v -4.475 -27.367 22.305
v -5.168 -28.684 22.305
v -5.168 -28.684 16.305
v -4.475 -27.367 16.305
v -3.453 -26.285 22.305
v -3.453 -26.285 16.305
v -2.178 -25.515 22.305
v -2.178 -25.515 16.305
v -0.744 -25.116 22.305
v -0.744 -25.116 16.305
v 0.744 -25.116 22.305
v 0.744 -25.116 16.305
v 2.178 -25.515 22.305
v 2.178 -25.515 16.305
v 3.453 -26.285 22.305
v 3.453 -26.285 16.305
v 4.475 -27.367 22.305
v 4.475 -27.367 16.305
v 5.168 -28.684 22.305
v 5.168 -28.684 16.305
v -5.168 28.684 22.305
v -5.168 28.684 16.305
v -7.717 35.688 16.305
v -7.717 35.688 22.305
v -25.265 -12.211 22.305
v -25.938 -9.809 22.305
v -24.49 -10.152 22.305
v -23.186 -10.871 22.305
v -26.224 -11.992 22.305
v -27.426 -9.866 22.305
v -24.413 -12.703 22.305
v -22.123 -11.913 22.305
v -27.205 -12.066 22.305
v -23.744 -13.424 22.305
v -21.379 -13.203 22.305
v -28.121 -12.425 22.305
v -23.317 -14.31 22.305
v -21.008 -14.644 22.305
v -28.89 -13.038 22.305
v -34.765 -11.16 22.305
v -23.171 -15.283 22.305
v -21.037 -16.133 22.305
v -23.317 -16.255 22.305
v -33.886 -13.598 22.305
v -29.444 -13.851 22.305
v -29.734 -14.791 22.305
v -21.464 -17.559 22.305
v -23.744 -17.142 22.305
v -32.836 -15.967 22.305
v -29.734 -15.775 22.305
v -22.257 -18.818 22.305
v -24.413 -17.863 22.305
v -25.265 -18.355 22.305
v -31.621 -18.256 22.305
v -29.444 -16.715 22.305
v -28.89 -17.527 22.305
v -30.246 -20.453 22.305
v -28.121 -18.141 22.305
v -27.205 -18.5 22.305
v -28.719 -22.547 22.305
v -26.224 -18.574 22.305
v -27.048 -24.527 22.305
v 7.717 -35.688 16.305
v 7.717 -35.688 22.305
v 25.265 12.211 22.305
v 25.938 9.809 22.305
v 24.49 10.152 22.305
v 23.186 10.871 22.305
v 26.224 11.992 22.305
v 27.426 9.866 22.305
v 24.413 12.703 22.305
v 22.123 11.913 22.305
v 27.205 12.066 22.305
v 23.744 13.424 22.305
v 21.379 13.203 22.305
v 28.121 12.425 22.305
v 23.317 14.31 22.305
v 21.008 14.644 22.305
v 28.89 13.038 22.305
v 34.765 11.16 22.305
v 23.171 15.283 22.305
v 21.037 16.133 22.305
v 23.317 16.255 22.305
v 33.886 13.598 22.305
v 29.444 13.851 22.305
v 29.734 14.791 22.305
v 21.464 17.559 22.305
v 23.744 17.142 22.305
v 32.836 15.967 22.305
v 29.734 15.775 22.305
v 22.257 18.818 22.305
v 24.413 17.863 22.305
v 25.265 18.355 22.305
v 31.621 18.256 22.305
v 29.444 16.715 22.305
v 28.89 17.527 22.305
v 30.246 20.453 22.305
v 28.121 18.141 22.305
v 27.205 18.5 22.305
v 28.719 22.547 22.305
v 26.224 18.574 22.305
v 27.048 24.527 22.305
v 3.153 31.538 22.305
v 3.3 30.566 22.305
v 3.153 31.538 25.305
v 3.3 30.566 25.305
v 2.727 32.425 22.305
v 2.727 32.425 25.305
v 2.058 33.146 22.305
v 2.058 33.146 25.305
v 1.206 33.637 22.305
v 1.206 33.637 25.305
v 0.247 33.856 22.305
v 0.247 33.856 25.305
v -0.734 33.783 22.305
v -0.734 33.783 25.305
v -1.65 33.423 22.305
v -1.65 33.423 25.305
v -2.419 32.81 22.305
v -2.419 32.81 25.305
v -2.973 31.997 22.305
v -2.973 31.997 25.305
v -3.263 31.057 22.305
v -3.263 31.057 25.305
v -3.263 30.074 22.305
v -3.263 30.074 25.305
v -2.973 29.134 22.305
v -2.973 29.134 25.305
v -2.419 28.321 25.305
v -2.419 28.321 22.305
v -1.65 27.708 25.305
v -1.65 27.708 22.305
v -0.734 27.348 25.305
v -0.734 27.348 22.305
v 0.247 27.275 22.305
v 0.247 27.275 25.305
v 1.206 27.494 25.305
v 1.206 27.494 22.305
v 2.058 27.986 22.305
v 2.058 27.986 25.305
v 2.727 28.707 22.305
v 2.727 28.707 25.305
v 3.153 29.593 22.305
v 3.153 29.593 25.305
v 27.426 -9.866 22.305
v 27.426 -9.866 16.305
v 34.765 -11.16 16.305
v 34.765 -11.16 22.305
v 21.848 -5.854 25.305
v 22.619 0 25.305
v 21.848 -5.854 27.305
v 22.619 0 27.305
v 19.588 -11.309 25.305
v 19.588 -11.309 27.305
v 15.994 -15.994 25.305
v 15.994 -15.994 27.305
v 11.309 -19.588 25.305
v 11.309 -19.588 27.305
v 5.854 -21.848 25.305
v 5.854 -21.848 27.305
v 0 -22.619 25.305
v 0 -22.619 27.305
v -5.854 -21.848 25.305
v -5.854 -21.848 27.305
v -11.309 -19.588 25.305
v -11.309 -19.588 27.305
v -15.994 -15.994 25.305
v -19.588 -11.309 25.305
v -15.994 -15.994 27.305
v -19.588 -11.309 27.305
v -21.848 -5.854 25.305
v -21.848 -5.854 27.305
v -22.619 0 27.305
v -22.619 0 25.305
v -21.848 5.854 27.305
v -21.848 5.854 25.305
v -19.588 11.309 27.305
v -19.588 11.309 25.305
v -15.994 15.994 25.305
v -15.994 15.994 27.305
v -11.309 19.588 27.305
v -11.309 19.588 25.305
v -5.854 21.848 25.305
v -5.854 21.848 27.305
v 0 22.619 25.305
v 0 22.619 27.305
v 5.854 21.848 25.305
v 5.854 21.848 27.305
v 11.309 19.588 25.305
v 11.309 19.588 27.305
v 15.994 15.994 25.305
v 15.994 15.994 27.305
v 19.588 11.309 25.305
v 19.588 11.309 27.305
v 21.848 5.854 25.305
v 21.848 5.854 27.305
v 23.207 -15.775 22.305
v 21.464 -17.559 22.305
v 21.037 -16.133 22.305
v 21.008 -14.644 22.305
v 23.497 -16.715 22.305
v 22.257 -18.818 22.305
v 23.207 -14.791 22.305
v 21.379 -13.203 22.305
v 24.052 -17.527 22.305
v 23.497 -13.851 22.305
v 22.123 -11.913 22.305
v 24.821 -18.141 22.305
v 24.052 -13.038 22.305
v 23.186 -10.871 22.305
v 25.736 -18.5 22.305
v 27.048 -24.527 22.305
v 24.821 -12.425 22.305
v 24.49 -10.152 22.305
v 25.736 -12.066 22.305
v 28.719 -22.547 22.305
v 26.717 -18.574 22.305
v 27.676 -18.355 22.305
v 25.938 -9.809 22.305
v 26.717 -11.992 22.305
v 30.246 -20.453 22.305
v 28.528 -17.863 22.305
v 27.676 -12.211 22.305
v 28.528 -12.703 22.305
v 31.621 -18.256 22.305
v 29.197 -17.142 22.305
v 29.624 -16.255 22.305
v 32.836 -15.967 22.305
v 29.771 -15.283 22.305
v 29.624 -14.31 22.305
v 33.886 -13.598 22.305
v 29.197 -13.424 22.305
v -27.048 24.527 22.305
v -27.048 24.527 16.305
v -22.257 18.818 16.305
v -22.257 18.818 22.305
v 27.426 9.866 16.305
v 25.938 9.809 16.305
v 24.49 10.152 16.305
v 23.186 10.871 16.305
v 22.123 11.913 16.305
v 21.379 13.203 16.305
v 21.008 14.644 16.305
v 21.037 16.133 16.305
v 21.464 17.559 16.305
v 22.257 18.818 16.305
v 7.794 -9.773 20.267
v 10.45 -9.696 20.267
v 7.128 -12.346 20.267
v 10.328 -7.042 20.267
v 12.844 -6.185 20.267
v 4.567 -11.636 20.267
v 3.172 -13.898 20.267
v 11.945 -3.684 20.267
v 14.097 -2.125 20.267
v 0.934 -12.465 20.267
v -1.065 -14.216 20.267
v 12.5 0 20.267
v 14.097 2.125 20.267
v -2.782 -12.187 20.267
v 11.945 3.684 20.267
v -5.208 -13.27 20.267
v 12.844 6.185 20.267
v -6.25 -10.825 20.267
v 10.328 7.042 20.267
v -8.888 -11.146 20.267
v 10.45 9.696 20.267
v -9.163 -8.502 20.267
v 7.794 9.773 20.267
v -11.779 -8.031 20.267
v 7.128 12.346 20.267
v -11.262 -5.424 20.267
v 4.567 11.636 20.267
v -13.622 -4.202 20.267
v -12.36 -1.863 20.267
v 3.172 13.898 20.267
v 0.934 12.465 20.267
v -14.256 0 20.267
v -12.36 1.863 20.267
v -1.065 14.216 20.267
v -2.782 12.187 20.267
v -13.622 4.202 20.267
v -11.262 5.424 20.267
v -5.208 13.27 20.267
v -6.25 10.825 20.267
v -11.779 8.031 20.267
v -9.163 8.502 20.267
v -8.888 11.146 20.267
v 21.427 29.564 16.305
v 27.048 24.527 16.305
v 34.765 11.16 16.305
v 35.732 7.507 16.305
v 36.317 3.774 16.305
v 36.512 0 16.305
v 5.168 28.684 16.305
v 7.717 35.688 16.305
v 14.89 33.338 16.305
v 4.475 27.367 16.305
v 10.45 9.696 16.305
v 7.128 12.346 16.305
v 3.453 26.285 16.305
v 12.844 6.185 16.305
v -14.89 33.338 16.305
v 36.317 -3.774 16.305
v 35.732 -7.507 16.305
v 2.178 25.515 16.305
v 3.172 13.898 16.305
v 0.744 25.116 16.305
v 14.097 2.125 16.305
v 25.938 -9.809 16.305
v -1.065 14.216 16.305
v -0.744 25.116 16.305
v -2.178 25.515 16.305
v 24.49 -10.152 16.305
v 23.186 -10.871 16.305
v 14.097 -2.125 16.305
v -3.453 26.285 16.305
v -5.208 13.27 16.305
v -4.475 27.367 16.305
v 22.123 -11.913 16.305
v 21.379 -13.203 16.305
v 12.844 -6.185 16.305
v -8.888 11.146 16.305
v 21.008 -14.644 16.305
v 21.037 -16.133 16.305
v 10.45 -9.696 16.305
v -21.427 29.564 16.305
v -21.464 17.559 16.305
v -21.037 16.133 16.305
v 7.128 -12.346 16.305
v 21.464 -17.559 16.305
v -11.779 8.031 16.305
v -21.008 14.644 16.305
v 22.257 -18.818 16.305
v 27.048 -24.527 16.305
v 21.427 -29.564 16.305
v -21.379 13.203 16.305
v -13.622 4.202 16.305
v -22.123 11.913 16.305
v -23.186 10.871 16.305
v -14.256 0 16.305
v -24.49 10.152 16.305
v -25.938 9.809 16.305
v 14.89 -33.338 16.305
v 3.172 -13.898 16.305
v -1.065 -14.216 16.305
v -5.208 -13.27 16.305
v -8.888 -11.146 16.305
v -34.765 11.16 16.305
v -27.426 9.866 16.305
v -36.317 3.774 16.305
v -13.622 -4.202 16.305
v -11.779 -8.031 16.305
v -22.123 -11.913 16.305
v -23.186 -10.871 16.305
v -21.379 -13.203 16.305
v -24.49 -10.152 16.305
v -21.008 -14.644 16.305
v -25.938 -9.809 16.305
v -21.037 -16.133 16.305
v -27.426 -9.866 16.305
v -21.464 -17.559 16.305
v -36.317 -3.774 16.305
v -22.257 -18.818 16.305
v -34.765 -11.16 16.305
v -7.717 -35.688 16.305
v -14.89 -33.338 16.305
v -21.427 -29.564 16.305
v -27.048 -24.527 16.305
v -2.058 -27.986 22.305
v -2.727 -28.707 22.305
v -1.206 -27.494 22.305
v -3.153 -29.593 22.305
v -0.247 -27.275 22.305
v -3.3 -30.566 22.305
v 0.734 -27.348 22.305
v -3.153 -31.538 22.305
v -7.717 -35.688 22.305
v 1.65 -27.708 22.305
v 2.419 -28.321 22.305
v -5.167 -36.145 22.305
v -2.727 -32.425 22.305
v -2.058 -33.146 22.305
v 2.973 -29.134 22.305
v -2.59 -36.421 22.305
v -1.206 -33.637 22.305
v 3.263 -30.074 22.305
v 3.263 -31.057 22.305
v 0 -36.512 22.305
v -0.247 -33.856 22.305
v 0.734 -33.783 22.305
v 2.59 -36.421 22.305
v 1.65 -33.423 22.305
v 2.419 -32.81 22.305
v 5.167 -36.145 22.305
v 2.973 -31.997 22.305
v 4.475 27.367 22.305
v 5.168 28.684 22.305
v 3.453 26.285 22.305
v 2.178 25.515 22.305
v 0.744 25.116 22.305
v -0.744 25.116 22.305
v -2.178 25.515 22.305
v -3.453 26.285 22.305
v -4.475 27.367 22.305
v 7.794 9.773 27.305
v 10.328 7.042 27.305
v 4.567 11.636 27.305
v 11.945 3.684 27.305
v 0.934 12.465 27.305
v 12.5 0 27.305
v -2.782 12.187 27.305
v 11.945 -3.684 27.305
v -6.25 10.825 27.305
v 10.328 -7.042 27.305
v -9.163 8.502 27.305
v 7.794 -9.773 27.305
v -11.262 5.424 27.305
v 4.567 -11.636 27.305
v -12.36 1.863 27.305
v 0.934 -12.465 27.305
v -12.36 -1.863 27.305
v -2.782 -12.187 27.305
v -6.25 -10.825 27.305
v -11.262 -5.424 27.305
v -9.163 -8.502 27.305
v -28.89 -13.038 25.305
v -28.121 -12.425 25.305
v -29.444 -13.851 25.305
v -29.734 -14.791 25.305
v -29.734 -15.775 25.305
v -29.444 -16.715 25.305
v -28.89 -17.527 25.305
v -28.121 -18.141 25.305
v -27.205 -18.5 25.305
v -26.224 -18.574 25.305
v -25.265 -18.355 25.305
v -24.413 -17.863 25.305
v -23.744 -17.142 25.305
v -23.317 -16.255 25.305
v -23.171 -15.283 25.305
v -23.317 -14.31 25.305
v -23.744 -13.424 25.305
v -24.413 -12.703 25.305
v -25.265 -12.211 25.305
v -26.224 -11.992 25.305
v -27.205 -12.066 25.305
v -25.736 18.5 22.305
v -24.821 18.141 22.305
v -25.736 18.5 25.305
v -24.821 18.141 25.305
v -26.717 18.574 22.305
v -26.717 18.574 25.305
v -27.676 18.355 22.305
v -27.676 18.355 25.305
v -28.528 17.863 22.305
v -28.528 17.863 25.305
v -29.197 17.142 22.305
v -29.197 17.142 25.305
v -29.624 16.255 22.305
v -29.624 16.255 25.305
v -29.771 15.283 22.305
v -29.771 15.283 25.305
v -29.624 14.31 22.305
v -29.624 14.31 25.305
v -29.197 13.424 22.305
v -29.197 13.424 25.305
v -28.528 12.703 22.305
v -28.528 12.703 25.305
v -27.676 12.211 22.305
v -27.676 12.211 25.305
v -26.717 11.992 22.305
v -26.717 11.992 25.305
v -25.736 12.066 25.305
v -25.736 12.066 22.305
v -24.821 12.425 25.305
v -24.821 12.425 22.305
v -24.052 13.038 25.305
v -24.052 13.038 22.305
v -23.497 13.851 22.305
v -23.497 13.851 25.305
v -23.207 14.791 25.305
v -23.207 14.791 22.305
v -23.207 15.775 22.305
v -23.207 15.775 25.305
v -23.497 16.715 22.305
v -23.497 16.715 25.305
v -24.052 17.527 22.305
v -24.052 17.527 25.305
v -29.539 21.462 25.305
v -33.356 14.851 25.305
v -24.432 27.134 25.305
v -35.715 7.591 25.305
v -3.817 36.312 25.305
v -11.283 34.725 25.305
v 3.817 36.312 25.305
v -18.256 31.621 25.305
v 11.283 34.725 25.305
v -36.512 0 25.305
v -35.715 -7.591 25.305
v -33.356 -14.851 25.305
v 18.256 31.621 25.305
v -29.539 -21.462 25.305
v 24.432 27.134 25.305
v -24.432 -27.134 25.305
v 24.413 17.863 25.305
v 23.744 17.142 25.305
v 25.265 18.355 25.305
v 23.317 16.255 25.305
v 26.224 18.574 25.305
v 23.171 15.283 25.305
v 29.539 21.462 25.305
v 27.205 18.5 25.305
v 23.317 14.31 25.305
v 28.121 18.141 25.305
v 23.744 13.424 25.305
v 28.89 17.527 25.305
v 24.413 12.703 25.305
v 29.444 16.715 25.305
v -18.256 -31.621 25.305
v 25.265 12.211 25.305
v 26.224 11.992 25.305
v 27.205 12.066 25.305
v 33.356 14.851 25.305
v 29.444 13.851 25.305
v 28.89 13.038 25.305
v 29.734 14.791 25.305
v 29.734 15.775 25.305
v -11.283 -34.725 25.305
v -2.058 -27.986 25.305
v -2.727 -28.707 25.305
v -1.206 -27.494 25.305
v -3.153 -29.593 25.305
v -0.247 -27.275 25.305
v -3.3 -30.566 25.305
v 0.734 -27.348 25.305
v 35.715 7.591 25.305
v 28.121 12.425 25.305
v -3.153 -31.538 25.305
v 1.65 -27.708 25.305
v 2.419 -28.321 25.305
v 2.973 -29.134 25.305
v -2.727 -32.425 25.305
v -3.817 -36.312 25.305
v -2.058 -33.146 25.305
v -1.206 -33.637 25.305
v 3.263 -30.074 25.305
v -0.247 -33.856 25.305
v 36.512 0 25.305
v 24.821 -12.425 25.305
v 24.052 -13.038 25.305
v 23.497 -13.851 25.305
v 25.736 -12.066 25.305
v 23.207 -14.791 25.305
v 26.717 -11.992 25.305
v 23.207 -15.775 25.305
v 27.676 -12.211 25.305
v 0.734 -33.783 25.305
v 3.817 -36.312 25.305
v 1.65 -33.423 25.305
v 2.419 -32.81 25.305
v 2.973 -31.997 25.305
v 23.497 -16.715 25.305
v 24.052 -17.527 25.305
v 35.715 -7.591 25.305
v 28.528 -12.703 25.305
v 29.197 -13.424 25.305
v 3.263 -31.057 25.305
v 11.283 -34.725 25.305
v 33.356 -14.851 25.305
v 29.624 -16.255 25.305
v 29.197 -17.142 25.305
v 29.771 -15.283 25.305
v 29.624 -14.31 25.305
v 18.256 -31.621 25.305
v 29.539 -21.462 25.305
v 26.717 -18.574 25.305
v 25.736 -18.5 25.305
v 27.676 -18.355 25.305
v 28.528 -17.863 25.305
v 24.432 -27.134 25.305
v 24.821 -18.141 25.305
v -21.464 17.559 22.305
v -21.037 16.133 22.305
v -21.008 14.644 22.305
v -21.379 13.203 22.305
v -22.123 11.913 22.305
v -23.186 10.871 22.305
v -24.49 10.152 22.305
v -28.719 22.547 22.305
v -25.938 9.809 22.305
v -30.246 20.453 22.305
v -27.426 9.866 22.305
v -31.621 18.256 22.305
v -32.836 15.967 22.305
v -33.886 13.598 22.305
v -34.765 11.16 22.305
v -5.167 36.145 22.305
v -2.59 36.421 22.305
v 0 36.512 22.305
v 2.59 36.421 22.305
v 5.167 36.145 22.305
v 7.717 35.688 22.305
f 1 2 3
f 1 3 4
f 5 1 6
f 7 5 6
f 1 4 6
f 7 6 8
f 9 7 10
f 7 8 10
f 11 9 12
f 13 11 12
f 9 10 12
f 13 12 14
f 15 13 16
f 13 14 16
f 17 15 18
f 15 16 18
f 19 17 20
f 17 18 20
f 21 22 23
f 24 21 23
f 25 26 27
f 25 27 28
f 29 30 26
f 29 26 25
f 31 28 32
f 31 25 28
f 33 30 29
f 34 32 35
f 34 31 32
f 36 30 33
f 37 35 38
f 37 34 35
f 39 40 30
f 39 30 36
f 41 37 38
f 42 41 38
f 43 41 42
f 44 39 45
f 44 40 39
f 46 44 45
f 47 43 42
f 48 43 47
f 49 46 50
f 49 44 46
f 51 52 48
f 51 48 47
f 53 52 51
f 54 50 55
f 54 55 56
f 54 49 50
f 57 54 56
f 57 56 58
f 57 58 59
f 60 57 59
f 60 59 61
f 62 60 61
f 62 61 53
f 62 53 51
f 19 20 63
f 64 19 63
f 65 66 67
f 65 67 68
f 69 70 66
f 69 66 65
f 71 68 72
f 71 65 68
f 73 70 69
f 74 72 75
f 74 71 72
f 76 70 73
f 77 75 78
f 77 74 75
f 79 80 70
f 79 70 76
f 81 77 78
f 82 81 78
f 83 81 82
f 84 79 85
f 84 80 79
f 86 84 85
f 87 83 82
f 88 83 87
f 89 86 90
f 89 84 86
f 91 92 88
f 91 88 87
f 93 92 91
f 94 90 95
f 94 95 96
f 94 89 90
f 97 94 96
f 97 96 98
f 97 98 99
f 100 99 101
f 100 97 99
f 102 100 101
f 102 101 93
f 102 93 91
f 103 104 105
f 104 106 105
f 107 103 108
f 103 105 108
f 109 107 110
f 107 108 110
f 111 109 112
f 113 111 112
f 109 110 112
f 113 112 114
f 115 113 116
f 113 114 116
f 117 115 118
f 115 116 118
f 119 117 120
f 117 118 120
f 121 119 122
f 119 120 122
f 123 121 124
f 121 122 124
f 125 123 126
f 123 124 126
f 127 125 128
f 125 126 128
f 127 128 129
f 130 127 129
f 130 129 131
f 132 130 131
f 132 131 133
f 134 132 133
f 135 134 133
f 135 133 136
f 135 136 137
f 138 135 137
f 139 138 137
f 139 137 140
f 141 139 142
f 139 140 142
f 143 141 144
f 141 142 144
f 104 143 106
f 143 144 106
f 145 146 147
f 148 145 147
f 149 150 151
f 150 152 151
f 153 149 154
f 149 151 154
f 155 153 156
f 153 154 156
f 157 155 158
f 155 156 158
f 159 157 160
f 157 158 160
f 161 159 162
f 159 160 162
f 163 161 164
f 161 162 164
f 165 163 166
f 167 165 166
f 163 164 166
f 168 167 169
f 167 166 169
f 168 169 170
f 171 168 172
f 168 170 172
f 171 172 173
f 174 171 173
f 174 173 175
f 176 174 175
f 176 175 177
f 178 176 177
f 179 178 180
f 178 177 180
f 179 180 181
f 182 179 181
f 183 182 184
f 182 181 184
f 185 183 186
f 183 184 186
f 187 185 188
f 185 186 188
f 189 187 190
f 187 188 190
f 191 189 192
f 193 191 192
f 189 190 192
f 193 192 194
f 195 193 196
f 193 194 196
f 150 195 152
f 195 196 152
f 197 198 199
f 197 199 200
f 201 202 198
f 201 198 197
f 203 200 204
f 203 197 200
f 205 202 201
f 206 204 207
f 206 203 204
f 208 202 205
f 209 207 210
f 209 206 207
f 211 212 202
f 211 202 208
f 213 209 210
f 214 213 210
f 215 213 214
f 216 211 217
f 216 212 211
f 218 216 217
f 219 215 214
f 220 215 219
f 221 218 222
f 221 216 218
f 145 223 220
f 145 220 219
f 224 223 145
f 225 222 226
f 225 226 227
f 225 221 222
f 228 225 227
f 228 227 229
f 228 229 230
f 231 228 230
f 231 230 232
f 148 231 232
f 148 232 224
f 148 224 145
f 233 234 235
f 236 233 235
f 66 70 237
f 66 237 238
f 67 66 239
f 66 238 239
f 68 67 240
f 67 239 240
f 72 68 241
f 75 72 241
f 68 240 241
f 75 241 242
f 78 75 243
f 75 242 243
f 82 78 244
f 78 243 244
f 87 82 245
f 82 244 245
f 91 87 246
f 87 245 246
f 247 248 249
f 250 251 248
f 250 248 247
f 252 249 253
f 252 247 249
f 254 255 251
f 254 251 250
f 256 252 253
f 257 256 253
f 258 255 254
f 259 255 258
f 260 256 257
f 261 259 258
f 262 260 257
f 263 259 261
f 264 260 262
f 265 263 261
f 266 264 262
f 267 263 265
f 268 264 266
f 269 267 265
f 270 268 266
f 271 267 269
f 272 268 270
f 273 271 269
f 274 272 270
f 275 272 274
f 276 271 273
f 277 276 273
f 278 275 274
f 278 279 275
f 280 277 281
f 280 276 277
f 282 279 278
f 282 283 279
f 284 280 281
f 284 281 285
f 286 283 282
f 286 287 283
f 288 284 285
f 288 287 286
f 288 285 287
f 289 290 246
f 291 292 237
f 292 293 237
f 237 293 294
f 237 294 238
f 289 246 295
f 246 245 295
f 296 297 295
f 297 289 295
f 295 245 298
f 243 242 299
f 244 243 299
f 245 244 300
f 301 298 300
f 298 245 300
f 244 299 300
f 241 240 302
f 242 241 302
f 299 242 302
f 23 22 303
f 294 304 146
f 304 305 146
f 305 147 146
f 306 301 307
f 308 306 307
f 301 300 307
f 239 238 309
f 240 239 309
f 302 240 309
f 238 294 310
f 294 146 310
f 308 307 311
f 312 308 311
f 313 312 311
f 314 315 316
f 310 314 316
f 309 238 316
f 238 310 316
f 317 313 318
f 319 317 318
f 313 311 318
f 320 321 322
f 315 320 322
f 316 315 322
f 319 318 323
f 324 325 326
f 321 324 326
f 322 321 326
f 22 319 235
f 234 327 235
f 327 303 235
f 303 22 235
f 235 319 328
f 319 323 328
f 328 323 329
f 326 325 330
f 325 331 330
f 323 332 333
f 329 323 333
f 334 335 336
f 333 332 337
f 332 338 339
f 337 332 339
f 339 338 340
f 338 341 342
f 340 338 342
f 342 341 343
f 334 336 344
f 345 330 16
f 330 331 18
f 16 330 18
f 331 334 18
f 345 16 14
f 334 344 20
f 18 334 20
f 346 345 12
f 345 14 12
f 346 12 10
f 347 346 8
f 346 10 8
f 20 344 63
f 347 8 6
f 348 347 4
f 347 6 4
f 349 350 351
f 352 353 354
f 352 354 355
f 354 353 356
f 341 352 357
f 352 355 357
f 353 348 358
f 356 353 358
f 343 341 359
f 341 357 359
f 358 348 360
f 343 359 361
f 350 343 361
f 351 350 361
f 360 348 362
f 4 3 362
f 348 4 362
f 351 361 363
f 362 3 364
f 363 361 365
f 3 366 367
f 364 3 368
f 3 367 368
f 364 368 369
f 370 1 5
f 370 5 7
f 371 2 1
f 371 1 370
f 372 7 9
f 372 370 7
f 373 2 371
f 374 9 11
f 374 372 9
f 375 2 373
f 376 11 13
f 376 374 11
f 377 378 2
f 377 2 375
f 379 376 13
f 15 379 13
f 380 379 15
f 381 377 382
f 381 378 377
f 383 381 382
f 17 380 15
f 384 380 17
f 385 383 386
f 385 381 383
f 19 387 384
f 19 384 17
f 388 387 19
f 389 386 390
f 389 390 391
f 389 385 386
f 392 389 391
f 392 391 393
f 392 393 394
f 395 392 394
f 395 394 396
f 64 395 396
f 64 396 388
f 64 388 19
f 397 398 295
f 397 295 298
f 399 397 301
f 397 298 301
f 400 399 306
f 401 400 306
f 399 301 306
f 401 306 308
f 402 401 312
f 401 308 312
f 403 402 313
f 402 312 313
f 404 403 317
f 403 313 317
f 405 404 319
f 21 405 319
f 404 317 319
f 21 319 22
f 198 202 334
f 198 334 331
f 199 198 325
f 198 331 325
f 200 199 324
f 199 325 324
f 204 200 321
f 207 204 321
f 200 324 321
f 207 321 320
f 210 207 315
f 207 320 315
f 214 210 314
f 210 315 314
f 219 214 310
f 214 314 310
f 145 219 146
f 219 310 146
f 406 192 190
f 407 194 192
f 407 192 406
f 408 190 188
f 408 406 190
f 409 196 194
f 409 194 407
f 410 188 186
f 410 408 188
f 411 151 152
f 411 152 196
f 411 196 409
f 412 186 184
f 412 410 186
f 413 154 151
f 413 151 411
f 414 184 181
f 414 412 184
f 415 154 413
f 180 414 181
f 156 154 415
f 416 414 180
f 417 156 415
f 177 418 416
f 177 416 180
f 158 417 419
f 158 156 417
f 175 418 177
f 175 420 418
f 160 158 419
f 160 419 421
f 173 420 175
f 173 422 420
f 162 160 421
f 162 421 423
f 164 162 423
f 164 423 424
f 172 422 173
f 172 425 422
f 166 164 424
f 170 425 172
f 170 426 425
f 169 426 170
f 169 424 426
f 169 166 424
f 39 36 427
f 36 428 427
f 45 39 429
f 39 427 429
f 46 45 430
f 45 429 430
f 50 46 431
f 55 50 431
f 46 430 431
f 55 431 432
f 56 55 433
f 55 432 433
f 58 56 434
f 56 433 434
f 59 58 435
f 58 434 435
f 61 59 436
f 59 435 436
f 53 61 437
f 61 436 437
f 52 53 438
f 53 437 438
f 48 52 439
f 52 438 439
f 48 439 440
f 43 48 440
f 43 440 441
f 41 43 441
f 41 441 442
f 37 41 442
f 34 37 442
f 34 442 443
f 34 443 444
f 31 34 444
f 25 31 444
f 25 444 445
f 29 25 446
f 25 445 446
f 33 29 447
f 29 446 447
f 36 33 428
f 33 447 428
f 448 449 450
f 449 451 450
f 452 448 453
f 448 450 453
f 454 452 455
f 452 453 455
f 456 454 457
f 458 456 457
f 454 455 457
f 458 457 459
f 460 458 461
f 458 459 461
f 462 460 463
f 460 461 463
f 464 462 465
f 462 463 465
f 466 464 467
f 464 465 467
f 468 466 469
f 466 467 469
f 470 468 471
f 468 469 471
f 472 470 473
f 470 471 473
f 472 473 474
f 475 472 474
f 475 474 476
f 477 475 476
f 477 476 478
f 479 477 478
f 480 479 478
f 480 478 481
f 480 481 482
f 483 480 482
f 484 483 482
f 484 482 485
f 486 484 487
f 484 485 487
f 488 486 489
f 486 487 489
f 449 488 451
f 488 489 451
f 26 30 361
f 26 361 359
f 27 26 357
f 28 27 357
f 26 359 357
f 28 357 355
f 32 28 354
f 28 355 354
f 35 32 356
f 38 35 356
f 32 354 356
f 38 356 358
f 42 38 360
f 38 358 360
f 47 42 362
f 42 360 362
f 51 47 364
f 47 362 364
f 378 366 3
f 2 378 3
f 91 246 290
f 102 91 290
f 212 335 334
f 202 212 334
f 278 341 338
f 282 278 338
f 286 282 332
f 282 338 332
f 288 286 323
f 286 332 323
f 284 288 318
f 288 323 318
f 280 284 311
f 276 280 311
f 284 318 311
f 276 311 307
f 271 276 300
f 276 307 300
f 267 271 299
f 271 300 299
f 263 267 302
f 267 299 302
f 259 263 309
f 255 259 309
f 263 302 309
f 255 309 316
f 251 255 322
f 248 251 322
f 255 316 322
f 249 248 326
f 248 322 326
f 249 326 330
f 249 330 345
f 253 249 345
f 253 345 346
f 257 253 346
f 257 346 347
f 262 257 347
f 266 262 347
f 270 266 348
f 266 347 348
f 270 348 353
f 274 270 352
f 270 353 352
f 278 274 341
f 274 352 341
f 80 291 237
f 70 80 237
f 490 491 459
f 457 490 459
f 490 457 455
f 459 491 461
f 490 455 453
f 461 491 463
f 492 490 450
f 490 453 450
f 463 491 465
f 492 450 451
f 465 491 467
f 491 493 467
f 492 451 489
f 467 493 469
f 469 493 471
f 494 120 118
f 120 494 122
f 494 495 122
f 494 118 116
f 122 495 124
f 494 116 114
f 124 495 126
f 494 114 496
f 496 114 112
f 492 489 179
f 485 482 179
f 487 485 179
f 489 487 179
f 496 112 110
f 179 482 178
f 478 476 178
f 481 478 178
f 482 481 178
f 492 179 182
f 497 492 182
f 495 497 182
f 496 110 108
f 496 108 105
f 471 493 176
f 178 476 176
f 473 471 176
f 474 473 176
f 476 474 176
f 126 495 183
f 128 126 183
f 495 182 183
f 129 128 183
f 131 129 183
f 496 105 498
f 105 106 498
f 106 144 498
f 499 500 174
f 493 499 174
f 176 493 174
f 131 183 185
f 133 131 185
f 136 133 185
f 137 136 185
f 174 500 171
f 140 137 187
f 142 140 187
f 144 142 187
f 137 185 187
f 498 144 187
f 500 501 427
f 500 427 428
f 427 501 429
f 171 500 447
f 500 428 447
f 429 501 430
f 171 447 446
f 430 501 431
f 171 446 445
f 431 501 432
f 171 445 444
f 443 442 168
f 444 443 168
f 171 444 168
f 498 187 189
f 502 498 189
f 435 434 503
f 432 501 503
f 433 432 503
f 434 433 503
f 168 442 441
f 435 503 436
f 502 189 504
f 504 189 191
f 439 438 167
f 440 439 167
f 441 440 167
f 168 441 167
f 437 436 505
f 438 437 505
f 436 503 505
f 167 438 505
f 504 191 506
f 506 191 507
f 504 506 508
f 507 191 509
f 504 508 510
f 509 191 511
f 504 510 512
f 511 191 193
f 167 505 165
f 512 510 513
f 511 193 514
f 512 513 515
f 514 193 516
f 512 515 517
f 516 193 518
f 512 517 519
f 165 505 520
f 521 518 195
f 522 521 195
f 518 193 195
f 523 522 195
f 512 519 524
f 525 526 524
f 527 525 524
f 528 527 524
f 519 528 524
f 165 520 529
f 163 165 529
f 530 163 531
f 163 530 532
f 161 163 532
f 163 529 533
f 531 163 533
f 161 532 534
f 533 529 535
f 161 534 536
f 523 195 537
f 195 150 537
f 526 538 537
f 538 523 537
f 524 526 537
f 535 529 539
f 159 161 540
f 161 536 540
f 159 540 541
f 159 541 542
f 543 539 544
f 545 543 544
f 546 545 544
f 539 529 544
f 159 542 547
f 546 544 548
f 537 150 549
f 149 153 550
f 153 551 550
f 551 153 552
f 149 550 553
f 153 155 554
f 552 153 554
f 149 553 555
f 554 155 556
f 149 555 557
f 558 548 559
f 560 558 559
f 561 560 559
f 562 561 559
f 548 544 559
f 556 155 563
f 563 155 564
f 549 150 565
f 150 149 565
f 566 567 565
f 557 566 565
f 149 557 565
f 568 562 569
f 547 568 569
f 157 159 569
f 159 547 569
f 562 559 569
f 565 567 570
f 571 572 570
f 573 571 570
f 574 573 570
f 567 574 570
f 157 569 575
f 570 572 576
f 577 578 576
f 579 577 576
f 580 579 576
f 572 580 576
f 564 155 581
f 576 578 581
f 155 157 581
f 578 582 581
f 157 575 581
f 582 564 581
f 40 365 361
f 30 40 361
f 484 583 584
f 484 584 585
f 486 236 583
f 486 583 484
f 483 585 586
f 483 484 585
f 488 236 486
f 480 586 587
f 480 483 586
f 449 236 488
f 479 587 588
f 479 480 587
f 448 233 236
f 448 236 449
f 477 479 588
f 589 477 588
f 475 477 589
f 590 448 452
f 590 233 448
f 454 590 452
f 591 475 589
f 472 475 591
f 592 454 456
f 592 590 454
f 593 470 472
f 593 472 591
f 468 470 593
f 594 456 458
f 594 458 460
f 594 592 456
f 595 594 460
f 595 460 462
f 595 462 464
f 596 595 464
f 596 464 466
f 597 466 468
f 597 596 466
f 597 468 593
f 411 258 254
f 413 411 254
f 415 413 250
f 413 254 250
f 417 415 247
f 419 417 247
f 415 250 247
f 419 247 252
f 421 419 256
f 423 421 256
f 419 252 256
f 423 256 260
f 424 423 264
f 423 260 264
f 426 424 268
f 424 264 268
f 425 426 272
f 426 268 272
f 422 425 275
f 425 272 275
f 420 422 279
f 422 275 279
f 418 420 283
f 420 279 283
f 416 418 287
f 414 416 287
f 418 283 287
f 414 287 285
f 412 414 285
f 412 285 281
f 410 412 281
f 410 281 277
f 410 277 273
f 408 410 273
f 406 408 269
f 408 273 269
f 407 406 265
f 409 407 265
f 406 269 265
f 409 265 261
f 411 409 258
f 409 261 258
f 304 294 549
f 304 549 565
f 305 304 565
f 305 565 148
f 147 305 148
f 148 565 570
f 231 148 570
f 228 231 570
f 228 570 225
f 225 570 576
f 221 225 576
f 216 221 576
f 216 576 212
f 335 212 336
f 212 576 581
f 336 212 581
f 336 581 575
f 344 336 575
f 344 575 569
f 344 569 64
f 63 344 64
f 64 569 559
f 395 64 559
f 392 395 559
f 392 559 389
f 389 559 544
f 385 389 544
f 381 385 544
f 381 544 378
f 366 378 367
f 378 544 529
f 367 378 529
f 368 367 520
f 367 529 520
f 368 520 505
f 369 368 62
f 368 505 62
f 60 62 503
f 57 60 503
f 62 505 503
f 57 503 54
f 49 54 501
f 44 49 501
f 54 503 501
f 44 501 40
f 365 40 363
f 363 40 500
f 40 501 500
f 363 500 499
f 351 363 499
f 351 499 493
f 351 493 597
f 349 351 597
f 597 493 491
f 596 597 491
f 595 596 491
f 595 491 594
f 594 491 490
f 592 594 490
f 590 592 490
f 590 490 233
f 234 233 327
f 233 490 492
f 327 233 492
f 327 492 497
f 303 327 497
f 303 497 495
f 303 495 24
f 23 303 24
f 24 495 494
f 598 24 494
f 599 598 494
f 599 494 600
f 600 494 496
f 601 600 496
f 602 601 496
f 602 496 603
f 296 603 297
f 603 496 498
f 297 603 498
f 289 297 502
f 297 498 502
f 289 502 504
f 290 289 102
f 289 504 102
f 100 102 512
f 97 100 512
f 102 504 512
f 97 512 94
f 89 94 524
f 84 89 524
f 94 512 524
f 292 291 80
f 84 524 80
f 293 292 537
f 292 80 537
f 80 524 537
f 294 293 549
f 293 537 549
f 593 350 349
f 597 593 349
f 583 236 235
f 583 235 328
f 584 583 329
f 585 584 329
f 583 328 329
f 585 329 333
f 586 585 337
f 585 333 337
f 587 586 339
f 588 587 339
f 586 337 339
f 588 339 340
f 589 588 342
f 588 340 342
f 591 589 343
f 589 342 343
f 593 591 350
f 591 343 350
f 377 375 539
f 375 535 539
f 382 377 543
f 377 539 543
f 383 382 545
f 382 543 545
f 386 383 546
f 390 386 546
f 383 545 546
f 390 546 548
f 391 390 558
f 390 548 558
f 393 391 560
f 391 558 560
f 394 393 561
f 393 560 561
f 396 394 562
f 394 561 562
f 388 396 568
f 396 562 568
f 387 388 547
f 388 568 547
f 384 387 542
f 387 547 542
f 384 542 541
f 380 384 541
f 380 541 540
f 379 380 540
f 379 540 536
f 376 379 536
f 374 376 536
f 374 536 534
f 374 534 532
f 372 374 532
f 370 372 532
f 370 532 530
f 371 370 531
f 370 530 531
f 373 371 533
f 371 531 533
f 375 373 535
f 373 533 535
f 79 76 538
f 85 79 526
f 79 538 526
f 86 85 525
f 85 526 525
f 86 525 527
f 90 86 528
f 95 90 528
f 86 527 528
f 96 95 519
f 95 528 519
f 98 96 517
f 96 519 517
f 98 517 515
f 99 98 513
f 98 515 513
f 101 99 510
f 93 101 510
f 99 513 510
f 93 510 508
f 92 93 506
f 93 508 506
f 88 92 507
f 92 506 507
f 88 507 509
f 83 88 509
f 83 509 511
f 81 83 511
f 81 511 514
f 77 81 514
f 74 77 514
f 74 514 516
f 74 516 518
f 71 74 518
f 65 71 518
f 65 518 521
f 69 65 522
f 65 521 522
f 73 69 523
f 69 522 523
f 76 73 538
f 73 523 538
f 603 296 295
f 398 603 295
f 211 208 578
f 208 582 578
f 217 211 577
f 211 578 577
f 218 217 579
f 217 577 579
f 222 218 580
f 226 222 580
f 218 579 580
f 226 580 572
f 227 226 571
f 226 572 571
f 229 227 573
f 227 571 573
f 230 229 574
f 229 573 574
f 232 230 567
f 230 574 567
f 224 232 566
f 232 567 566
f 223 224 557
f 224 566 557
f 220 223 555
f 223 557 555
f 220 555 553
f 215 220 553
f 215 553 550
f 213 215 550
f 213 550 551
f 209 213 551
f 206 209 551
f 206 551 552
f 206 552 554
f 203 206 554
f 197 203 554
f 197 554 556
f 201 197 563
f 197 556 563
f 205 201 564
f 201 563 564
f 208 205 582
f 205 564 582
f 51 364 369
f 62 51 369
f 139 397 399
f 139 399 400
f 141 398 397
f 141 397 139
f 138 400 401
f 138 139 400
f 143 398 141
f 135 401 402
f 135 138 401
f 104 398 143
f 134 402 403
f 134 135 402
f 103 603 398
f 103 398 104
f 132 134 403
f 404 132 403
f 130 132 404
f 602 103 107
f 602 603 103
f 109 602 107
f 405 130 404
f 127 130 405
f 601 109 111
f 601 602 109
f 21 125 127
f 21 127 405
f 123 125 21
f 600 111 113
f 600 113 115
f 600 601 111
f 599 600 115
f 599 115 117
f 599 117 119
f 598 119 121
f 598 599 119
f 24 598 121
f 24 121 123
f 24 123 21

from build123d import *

# Parameters (mm, degrees)
SKETCH_SPINDLE_SKELETON_W      = 1.000000064
SKETCH_SPINDLE_SKELETON_H      = 10.1187
CUT_CENTER_DEPTH               = 53.414934066
CUT_CENTER_DEPTH_BACK          = 53.414934066
SKETCH_CENTER_CUT_R            = 12.5
CBORE_FOR_M6_SHCS1_D           = 6.6
CBORE_FOR_M6_SHCS1_CBORE_D     = 11
CBORE_FOR_M6_SHCS1_CBORE_DEPTH = 6
CIRPATTERN1_COUNT              = 6
SKETCH1_R                      = 14.25575
CUT_EXTRUDE1_DEPTH             = 3.9624
CUT_EXTRUDE2_DEPTH             = 6
CIRPATTERN2_COUNT              = 6


with BuildPart() as part:
    # Sketch Spindle Skeleton → Main Revolve (revolve)
    with BuildSketch(Plane(origin=(0, 0, 0), x_dir=(0, 0, -1), z_dir=(1, 0, 0)), mode=Mode.PRIVATE) as main_revolve_sk:
        Polygon((-25.304999936, 12.5), (-25.304999936, 9.525), (-16.304999902, 9.525), (-16.304999902, 36.5125), (-25.304999936, 36.5125), (-25.304999936, 22.6187), (-26.304999936, 22.6187), (-26.304999936, 12.5), align=None)
        with Locations((-26.804999968, 17.55935)):
            Rectangle(SKETCH_SPINDLE_SKELETON_W, SKETCH_SPINDLE_SKELETON_H)
    revolve(main_revolve_sk.sketch.rotate(Axis((0, 0, 1000), (0, 0, -1)), 90), axis=Axis((0, 0, 1000), (0, 0, -1)))

    # Sketch Center Cut → Cut Center (cut, two sides: drawn at the far end of the back side and taken through both)
    with BuildSketch(Plane.XY.offset(25.304999936).offset(-CUT_CENTER_DEPTH_BACK)):
        Circle(SKETCH_CENTER_CUT_R)
    extrude(amount=CUT_CENTER_DEPTH + CUT_CENTER_DEPTH_BACK, mode=Mode.SUBTRACT)

    # CBORE for M6 SHCS1 (through all)
    with Locations(Plane(origin=(0, 0, 16.304999902), x_dir=(-1, 0, 0), z_dir=(0, 0, -1))):
        with Locations((0, 30.565600032)):
            cbore_for_m6_shcs1 = CounterBoreHole(CBORE_FOR_M6_SHCS1_D / 2, CBORE_FOR_M6_SHCS1_CBORE_D / 2, CBORE_FOR_M6_SHCS1_CBORE_DEPTH)

    # CirPattern1: CBORE for M6 SHCS1 ×6 about axis
    cirpattern1_axis = Axis((0, 0, 0), (0, 0, 1))
    for i in range(1, CIRPATTERN1_COUNT):
        add(cbore_for_m6_shcs1.rotate(cirpattern1_axis, i * 360 / CIRPATTERN1_COUNT), mode=Mode.SUBTRACT)

    # Sketch1 → Cut-Extrude1 (cut)
    with BuildSketch(Plane(origin=(0, 0, 16.304999902), x_dir=(-1, 0, 0), z_dir=(0, 0, -1))):
        Circle(SKETCH1_R)
    extrude(amount=-CUT_EXTRUDE1_DEPTH, mode=Mode.SUBTRACT)

    # Sketch2 → Cut-Extrude2 (cut)
    with BuildSketch(Plane(origin=(0, 0, 16.304999902), x_dir=(-1, 0, 0), z_dir=(0, 0, -1))):
        with BuildLine():
            ThreePointArc((5.5, 30.565600032), (5.416442642, 29.610535055), (5.168309414, 28.684489244))
            Line((5.168309414, 28.684489244), (7.71724355, 35.687628224))
            ThreePointArc((7.71724355, 35.687628224), (3.88060116, 36.305696397), (0, 36.5125))
            Line((0, 36.5125), (0, 36.065600032))
            ThreePointArc((0, 36.065600032), (3.889087297, 34.454687329), (5.5, 30.565600032))
        make_face()
        with BuildLine():
            Line((-7.71724355, 35.687628224), (-5.168309414, 28.684489244))
            ThreePointArc((-5.168309414, 28.684489244), (-4.505336244, 33.720270432), (0, 36.065600032))
            Line((0, 36.065600032), (0, 36.5125))
            ThreePointArc((0, 36.5125), (-3.88060116, 36.305696397), (-7.71724355, 35.687628224))
        make_face()
    cut_extrude2 = extrude(amount=-CUT_EXTRUDE2_DEPTH, mode=Mode.SUBTRACT)

    # CirPattern2: Cut-Extrude2 ×6 about axis
    cirpattern2_axis = Axis((0, 0, 0), (0, 0, 1))
    for i in range(1, CIRPATTERN2_COUNT):
        add(cut_extrude2.rotate(cirpattern2_axis, i * 360 / CIRPATTERN2_COUNT), mode=Mode.SUBTRACT)


solid = part.part
